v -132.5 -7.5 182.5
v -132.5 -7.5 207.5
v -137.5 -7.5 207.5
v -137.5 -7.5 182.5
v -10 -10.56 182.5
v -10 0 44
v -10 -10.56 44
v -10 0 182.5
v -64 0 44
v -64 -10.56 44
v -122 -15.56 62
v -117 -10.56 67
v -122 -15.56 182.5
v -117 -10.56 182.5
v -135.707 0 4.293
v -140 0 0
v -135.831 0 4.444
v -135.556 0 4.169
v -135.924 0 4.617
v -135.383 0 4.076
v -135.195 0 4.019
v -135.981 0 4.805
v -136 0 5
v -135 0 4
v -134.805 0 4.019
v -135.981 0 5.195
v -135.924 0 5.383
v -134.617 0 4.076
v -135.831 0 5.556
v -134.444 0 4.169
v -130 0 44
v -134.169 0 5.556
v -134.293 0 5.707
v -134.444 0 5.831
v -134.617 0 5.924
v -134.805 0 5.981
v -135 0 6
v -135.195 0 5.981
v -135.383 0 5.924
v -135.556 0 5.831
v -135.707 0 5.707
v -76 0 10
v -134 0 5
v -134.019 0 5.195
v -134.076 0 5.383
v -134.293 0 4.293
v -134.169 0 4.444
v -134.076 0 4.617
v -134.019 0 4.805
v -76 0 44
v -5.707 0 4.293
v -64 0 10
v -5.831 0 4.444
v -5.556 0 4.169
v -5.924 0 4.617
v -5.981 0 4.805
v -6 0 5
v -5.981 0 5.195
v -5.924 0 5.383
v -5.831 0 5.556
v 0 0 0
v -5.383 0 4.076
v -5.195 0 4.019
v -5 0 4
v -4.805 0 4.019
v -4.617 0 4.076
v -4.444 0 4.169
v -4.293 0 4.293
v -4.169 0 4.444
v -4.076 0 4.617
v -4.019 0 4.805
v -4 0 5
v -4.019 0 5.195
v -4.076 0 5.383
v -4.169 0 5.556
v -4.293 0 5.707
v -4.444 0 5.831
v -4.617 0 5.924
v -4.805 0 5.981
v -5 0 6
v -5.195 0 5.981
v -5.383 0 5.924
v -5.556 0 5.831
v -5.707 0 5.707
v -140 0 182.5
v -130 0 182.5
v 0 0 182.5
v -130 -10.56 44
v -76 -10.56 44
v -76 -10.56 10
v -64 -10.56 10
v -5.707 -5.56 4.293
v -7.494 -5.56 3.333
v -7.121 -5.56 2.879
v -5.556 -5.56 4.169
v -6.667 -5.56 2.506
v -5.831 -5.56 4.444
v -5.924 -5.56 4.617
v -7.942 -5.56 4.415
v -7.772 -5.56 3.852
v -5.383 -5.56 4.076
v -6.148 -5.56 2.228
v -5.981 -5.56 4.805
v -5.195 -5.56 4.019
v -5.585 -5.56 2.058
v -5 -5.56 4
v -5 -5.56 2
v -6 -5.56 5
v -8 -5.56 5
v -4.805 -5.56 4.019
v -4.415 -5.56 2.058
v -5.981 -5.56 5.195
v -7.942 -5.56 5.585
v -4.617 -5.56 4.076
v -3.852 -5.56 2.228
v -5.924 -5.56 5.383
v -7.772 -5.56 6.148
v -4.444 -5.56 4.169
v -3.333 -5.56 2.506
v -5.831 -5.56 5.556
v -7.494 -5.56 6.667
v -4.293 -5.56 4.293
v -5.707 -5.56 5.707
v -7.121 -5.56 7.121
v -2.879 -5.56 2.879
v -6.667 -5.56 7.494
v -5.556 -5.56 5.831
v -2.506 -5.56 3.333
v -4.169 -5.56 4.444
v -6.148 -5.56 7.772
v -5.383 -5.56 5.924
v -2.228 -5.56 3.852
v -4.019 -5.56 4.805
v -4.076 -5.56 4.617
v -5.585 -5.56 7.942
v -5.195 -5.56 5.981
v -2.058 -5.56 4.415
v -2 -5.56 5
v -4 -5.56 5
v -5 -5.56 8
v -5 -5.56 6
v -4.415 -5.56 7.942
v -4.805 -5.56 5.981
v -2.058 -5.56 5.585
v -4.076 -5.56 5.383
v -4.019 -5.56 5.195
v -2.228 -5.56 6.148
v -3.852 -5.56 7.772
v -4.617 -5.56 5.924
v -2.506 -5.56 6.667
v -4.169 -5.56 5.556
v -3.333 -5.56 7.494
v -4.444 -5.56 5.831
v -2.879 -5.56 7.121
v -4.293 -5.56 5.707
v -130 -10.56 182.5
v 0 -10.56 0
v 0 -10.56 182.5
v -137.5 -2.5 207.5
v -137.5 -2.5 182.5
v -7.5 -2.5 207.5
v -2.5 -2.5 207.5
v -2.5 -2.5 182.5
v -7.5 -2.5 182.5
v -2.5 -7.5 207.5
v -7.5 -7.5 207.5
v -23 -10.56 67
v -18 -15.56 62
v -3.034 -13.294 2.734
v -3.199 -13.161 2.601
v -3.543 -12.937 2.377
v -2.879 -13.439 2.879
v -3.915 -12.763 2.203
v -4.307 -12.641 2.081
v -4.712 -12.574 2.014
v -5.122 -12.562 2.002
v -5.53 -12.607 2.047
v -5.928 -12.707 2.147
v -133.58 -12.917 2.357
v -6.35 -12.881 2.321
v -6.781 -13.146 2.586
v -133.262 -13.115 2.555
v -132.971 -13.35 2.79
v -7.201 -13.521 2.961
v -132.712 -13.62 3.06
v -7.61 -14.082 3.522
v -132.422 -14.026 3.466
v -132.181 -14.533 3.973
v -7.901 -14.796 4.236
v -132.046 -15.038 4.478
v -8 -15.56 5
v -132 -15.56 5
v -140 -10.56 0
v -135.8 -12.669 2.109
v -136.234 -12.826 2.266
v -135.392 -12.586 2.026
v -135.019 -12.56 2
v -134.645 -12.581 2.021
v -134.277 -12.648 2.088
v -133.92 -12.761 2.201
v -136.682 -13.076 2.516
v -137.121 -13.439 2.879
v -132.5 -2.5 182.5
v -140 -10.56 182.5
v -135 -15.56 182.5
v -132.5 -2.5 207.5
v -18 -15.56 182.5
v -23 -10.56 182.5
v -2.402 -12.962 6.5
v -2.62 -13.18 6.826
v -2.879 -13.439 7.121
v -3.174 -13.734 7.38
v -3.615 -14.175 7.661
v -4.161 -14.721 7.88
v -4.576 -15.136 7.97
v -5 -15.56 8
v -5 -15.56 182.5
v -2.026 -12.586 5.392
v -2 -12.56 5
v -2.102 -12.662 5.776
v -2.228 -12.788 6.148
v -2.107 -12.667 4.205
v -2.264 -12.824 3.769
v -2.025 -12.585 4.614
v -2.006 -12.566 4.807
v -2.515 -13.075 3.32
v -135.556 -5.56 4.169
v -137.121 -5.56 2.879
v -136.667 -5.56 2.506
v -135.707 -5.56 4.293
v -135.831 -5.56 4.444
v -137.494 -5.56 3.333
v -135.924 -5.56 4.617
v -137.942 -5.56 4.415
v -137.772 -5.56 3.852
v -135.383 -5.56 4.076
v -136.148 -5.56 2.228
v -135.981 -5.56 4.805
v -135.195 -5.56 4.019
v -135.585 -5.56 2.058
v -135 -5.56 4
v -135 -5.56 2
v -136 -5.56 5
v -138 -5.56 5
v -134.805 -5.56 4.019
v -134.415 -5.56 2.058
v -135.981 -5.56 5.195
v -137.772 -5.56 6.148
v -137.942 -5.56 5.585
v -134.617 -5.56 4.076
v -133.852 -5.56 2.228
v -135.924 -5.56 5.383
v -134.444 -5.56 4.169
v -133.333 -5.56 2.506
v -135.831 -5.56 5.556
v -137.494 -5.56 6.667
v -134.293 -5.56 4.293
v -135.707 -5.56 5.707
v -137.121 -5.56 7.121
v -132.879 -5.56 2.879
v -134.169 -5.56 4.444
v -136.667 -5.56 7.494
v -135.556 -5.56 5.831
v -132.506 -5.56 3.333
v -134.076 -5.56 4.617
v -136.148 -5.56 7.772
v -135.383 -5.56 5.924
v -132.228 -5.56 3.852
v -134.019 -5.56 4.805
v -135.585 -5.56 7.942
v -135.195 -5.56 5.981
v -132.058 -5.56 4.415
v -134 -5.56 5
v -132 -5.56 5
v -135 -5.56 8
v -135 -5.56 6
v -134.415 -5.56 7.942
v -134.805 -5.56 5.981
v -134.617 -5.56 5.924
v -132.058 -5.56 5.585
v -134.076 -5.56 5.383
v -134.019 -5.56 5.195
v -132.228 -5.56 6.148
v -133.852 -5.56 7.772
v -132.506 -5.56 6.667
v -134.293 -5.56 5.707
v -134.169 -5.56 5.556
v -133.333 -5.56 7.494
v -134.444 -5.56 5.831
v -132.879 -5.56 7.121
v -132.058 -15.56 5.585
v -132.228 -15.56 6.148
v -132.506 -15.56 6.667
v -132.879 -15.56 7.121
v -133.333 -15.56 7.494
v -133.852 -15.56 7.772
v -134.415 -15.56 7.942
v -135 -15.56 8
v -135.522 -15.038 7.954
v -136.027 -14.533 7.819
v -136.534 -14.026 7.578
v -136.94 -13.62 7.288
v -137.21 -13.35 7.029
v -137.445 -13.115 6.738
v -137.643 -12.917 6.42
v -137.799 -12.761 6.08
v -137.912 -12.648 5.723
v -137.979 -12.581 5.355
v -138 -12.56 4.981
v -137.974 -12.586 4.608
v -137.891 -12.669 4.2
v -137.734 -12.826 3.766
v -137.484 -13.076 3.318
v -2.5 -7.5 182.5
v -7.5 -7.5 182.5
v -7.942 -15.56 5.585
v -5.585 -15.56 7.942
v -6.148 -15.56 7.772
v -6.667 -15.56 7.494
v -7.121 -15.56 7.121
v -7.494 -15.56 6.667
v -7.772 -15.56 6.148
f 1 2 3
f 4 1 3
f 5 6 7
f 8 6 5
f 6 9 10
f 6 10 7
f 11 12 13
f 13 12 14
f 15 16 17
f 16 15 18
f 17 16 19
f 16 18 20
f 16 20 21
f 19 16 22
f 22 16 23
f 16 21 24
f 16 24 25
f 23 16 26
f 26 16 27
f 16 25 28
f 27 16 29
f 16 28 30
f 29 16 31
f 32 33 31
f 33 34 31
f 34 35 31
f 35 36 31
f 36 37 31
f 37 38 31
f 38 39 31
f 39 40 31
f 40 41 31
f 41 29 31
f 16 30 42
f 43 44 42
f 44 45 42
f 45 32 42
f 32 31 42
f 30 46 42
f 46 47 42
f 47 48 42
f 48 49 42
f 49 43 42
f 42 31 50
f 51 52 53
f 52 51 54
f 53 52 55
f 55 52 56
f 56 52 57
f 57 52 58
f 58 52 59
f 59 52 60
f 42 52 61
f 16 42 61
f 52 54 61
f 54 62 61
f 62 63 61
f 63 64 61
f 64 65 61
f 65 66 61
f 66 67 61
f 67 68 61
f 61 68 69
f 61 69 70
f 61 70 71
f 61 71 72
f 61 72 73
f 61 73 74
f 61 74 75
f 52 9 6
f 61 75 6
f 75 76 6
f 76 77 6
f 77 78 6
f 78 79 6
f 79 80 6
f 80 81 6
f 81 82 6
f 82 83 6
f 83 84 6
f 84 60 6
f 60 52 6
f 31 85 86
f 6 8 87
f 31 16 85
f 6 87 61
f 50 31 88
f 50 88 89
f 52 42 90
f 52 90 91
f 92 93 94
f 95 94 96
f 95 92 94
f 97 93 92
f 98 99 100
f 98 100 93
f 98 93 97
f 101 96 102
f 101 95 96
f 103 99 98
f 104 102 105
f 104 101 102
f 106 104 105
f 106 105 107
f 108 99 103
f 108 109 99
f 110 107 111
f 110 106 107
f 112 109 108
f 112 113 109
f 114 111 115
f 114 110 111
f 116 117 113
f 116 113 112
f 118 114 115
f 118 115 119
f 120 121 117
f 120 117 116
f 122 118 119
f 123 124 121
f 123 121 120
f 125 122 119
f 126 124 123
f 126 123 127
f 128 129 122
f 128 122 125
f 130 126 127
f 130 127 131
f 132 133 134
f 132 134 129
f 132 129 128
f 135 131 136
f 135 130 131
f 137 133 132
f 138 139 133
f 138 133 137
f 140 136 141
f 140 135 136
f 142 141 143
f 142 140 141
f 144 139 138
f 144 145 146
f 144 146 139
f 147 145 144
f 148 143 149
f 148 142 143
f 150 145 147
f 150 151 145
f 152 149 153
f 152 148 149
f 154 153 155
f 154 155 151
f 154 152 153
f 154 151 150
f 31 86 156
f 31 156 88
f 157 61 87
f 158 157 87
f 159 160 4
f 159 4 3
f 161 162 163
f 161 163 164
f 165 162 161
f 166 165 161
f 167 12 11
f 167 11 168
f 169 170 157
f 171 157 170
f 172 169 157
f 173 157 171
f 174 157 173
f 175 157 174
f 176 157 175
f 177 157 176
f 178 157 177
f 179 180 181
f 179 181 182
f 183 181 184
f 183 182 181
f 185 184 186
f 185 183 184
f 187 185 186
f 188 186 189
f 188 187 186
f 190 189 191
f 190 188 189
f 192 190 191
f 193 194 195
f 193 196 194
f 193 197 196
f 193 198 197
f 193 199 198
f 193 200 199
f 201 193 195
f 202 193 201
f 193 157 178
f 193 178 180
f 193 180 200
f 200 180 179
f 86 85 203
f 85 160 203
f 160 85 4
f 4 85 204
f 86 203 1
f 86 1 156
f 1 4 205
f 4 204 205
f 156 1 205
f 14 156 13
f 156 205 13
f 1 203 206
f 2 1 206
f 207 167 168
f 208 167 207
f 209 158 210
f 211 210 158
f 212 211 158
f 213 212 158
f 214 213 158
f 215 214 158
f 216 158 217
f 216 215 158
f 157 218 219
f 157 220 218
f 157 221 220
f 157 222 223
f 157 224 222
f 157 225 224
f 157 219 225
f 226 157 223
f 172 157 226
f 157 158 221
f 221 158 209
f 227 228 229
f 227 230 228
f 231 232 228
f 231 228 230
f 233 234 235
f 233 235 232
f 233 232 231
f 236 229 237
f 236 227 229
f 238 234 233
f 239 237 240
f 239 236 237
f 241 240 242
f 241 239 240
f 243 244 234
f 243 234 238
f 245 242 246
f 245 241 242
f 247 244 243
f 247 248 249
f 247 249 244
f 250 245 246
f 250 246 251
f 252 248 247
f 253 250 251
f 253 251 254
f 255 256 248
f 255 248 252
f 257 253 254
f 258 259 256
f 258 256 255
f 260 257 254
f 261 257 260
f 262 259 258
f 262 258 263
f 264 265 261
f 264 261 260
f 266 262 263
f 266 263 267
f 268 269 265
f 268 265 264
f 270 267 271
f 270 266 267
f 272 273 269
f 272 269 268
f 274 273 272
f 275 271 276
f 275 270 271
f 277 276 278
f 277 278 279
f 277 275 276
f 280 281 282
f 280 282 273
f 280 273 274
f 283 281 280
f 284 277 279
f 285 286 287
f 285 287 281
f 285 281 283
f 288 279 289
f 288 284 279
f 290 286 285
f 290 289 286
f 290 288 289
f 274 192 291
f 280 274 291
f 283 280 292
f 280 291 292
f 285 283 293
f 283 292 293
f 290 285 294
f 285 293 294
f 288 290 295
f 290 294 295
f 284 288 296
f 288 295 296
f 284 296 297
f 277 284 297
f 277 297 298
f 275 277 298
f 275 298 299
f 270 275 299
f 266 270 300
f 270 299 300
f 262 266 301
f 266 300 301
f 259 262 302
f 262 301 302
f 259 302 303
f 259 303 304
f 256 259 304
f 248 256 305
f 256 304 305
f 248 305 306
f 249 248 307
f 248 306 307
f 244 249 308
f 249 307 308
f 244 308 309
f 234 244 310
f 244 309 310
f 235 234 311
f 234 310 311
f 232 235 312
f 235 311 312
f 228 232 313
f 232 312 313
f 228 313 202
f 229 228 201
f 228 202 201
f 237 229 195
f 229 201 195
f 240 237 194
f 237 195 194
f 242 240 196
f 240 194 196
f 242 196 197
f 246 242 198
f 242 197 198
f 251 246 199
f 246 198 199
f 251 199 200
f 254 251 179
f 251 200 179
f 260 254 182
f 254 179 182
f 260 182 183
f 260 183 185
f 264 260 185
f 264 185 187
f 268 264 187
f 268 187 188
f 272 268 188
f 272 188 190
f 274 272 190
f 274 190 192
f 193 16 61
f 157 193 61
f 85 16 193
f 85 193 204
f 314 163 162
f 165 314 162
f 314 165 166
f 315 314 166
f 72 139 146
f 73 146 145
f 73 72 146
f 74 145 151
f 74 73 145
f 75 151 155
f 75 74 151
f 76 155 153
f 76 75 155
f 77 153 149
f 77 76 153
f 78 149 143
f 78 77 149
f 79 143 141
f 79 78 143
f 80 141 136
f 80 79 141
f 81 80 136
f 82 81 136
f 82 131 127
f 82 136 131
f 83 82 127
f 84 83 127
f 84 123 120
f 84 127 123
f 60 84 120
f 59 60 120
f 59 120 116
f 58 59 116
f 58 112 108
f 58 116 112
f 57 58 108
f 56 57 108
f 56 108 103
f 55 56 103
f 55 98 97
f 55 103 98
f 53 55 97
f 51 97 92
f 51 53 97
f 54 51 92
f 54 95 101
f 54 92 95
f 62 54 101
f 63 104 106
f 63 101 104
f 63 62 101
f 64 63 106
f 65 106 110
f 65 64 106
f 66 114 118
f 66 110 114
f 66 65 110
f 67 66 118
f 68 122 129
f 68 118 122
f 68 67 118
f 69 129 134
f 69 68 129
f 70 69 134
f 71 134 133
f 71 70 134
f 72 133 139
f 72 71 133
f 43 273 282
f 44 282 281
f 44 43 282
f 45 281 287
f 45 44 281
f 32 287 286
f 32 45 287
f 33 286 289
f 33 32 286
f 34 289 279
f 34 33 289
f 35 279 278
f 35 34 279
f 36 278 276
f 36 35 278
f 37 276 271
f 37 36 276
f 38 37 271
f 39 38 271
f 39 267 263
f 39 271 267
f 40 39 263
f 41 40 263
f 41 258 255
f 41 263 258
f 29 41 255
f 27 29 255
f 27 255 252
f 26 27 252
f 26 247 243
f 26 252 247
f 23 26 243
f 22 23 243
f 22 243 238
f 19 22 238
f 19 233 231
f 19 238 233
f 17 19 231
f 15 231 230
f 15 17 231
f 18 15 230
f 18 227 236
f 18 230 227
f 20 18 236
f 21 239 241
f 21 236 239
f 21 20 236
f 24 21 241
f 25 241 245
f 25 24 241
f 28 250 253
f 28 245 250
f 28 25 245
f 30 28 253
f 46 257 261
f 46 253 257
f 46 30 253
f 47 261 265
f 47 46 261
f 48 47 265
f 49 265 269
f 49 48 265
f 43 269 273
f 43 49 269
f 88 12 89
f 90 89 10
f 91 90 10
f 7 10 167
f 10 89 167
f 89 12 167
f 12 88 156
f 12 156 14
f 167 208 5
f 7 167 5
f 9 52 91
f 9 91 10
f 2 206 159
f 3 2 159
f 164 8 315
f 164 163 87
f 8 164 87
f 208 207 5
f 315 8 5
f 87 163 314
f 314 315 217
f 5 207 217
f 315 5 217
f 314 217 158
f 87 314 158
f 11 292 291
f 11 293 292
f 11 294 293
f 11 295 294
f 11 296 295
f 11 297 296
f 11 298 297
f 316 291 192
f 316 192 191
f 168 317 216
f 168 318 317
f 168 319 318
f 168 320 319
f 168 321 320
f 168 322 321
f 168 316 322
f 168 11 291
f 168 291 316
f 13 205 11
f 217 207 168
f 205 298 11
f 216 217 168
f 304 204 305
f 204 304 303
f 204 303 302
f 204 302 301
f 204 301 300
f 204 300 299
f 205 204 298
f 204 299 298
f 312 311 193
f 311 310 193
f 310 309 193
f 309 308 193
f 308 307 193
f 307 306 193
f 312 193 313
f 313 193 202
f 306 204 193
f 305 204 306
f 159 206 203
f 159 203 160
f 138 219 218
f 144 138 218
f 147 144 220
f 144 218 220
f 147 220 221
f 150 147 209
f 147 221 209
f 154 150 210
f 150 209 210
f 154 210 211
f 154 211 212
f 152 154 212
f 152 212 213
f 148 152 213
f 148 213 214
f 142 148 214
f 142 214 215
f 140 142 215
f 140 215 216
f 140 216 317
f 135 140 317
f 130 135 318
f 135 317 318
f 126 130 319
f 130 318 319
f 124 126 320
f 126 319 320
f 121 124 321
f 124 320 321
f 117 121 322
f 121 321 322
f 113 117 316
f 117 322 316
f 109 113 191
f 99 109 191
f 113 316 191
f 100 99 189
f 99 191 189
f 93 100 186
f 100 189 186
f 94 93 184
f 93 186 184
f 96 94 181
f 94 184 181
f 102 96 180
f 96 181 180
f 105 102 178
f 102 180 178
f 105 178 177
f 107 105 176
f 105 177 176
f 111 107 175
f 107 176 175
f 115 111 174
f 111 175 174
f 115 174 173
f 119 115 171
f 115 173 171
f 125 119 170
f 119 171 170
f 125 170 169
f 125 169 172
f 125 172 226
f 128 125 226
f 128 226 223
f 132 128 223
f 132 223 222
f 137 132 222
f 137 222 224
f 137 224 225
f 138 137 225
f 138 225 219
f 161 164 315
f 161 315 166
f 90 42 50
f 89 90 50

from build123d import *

# Parameters (mm, degrees)
F0_W        = 140
F0_H        = 252.5
F0_R        = 1
F0_W_2      = 94
F0_H_2      = 152.5
F0_R_2      = 2.5
F0_W_3      = 12
F0_H_3      = 34
F1_DEPTH    = 15.56
F2_DEPTH    = 10.56
F3_T1_DEPTH = 165.7168298797
F3_T3_DEPTH = 278.2168298797
F4_SIZE     = 2.5
F5_R        = 3
F6_DEPTH    = 10
F7_SIZE     = 4.99999
F8_W        = 161.2529857084
F8_H        = 70
F9_DEPTH    = 25
F11_W       = 5
F11_H       = 50
F12_DEPTH   = 5


# Not quite as in the source:
# - a fillet or chamfer that OpenCascade refuses, or shapes differently, is made with other operations: its cross-section is extruded or revolved along the edge and cut away or added
# - a fillet or chamfer is up to 0.001 mm smaller than in the source, because OpenCascade refuses the exact size
# - a feature names something its author has since deleted; it is built from what else it names


with BuildPart() as f1:
    # F0 (on Front) → F1 (new body)
    with BuildSketch(Plane.XZ):
        with Locations((-70, 126.25)):
            Rectangle(F0_W, F0_H)
        with Locations((-135, 5)):
            Circle(F0_R, mode=Mode.SUBTRACT)
        with Locations((-5, 5)):
            Circle(F0_R, mode=Mode.SUBTRACT)
        with Locations((-135, 247.5)):
            Circle(F0_R, mode=Mode.SUBTRACT)
        Polygon((-130, 44), (-130, 242.5), (-10, 242.5), (-10, 44), (-64, 44), (-64, 10), (-76, 10), (-76, 44), align=None, mode=Mode.SUBTRACT)
        with Locations((-5, 247.5)):
            Circle(F0_R, mode=Mode.SUBTRACT)
        Polygon((-10, 242.5), (-130, 242.5), (-130, 44), (-76, 44), (-64, 44), (-10, 44), align=None)
        with Locations((-70, 143.25)):
            Rectangle(F0_W_2, F0_H_2, mode=Mode.SUBTRACT)
        with Locations((-70, 232.5)):
            Circle(F0_R_2, mode=Mode.SUBTRACT)
        with Locations((-70, 27)):
            Rectangle(F0_W_3, F0_H_3)
    extrude(amount=F1_DEPTH)

    # F0 (on Front) → F2 (cut)
    with BuildSketch(Plane.XZ):
        Polygon((-10, 242.5), (-130, 242.5), (-130, 44), (-76, 44), (-64, 44), (-10, 44), align=None)
        with Locations((-70, 143.25)):
            Rectangle(F0_W_2, F0_H_2, mode=Mode.SUBTRACT)
        with Locations((-70, 232.5)):
            Circle(F0_R_2, mode=Mode.SUBTRACT)
        with Locations((-70, 27)):
            Rectangle(F0_W_3, F0_H_3)
    extrude(amount=F2_DEPTH, mode=Mode.SUBTRACT)

    # F3: chamfer of 5 on 4 edges, made by hand

    # F3_s2 → F3_t1 (cut)
    with BuildSketch(Plane.YZ.offset(-152.8584149398)):
        Polygon((-10.56, 0), (-15.56, 5), (-15.56, 0), align=None)
        Polygon((-15.56, 247.5), (-10.56, 252.5), (-15.56, 252.5), align=None)
    extrude(amount=F3_T1_DEPTH, mode=Mode.SUBTRACT)

    # F3_s4 → F3_t3 (cut)
    with BuildSketch(Plane.XY.offset(-12.8584149398)):
        Polygon((-140, -10.56), (-135, -15.56), (-140, -15.56), align=None)
        Polygon((0, -10.56), (-5, -15.56), (0, -15.56), align=None)
    extrude(amount=F3_T3_DEPTH, mode=Mode.SUBTRACT)

    # F4
    f4_edges = [f1.edges().sort_by_distance(p)[0] for p in [
        (-72.5, -15.56, 232.5),
    ]]
    chamfer(f4_edges, length=F4_SIZE)

    # F5 (on face) → F6 (cut)
    with BuildSketch(Plane.XZ.offset(15.56)):
        with Locations((-135, 247.5)):
            Circle(F5_R)
        with Locations((-135, 5)):
            Circle(F5_R)
        with Locations((-5, 247.5)):
            Circle(F5_R)
        with Locations((-5, 5)):
            Circle(F5_R)
    extrude(amount=-F6_DEPTH, mode=Mode.SUBTRACT)

    # F7 (size 5 in the source; OpenCascade refuses exactly that, so slightly less here)
    f7_edges = [f1.edges().sort_by_distance(p)[0] for p in [
        (-70, -15.56, 67),
        (-117, -15.56, 143.25),
        (-23, -15.56, 143.25),
        (-70, -15.56, 219.5),
    ]]
    chamfer(f7_edges, length=F7_SIZE)

    # F8 (on face) → F9 (cut)
    with BuildSketch(Plane.XZ.offset(15.56)):
        with Locations((-74.815297965, 217.5)):
            Rectangle(F8_W, F8_H)
    extrude(amount=-F9_DEPTH, mode=Mode.SUBTRACT)

    # F11 (on offset) → F12 (join)
    with BuildSketch(Plane(origin=(0, -2.5, 0), x_dir=(-1, 0, 0), z_dir=(0, 1, 0))):
        with Locations((135, 182.5)):
            Rectangle(F11_W, F11_H)
        with Locations((5, 182.5)):
            Rectangle(F11_W, F11_H)
    extrude(amount=-F12_DEPTH)


solid = f1.part
